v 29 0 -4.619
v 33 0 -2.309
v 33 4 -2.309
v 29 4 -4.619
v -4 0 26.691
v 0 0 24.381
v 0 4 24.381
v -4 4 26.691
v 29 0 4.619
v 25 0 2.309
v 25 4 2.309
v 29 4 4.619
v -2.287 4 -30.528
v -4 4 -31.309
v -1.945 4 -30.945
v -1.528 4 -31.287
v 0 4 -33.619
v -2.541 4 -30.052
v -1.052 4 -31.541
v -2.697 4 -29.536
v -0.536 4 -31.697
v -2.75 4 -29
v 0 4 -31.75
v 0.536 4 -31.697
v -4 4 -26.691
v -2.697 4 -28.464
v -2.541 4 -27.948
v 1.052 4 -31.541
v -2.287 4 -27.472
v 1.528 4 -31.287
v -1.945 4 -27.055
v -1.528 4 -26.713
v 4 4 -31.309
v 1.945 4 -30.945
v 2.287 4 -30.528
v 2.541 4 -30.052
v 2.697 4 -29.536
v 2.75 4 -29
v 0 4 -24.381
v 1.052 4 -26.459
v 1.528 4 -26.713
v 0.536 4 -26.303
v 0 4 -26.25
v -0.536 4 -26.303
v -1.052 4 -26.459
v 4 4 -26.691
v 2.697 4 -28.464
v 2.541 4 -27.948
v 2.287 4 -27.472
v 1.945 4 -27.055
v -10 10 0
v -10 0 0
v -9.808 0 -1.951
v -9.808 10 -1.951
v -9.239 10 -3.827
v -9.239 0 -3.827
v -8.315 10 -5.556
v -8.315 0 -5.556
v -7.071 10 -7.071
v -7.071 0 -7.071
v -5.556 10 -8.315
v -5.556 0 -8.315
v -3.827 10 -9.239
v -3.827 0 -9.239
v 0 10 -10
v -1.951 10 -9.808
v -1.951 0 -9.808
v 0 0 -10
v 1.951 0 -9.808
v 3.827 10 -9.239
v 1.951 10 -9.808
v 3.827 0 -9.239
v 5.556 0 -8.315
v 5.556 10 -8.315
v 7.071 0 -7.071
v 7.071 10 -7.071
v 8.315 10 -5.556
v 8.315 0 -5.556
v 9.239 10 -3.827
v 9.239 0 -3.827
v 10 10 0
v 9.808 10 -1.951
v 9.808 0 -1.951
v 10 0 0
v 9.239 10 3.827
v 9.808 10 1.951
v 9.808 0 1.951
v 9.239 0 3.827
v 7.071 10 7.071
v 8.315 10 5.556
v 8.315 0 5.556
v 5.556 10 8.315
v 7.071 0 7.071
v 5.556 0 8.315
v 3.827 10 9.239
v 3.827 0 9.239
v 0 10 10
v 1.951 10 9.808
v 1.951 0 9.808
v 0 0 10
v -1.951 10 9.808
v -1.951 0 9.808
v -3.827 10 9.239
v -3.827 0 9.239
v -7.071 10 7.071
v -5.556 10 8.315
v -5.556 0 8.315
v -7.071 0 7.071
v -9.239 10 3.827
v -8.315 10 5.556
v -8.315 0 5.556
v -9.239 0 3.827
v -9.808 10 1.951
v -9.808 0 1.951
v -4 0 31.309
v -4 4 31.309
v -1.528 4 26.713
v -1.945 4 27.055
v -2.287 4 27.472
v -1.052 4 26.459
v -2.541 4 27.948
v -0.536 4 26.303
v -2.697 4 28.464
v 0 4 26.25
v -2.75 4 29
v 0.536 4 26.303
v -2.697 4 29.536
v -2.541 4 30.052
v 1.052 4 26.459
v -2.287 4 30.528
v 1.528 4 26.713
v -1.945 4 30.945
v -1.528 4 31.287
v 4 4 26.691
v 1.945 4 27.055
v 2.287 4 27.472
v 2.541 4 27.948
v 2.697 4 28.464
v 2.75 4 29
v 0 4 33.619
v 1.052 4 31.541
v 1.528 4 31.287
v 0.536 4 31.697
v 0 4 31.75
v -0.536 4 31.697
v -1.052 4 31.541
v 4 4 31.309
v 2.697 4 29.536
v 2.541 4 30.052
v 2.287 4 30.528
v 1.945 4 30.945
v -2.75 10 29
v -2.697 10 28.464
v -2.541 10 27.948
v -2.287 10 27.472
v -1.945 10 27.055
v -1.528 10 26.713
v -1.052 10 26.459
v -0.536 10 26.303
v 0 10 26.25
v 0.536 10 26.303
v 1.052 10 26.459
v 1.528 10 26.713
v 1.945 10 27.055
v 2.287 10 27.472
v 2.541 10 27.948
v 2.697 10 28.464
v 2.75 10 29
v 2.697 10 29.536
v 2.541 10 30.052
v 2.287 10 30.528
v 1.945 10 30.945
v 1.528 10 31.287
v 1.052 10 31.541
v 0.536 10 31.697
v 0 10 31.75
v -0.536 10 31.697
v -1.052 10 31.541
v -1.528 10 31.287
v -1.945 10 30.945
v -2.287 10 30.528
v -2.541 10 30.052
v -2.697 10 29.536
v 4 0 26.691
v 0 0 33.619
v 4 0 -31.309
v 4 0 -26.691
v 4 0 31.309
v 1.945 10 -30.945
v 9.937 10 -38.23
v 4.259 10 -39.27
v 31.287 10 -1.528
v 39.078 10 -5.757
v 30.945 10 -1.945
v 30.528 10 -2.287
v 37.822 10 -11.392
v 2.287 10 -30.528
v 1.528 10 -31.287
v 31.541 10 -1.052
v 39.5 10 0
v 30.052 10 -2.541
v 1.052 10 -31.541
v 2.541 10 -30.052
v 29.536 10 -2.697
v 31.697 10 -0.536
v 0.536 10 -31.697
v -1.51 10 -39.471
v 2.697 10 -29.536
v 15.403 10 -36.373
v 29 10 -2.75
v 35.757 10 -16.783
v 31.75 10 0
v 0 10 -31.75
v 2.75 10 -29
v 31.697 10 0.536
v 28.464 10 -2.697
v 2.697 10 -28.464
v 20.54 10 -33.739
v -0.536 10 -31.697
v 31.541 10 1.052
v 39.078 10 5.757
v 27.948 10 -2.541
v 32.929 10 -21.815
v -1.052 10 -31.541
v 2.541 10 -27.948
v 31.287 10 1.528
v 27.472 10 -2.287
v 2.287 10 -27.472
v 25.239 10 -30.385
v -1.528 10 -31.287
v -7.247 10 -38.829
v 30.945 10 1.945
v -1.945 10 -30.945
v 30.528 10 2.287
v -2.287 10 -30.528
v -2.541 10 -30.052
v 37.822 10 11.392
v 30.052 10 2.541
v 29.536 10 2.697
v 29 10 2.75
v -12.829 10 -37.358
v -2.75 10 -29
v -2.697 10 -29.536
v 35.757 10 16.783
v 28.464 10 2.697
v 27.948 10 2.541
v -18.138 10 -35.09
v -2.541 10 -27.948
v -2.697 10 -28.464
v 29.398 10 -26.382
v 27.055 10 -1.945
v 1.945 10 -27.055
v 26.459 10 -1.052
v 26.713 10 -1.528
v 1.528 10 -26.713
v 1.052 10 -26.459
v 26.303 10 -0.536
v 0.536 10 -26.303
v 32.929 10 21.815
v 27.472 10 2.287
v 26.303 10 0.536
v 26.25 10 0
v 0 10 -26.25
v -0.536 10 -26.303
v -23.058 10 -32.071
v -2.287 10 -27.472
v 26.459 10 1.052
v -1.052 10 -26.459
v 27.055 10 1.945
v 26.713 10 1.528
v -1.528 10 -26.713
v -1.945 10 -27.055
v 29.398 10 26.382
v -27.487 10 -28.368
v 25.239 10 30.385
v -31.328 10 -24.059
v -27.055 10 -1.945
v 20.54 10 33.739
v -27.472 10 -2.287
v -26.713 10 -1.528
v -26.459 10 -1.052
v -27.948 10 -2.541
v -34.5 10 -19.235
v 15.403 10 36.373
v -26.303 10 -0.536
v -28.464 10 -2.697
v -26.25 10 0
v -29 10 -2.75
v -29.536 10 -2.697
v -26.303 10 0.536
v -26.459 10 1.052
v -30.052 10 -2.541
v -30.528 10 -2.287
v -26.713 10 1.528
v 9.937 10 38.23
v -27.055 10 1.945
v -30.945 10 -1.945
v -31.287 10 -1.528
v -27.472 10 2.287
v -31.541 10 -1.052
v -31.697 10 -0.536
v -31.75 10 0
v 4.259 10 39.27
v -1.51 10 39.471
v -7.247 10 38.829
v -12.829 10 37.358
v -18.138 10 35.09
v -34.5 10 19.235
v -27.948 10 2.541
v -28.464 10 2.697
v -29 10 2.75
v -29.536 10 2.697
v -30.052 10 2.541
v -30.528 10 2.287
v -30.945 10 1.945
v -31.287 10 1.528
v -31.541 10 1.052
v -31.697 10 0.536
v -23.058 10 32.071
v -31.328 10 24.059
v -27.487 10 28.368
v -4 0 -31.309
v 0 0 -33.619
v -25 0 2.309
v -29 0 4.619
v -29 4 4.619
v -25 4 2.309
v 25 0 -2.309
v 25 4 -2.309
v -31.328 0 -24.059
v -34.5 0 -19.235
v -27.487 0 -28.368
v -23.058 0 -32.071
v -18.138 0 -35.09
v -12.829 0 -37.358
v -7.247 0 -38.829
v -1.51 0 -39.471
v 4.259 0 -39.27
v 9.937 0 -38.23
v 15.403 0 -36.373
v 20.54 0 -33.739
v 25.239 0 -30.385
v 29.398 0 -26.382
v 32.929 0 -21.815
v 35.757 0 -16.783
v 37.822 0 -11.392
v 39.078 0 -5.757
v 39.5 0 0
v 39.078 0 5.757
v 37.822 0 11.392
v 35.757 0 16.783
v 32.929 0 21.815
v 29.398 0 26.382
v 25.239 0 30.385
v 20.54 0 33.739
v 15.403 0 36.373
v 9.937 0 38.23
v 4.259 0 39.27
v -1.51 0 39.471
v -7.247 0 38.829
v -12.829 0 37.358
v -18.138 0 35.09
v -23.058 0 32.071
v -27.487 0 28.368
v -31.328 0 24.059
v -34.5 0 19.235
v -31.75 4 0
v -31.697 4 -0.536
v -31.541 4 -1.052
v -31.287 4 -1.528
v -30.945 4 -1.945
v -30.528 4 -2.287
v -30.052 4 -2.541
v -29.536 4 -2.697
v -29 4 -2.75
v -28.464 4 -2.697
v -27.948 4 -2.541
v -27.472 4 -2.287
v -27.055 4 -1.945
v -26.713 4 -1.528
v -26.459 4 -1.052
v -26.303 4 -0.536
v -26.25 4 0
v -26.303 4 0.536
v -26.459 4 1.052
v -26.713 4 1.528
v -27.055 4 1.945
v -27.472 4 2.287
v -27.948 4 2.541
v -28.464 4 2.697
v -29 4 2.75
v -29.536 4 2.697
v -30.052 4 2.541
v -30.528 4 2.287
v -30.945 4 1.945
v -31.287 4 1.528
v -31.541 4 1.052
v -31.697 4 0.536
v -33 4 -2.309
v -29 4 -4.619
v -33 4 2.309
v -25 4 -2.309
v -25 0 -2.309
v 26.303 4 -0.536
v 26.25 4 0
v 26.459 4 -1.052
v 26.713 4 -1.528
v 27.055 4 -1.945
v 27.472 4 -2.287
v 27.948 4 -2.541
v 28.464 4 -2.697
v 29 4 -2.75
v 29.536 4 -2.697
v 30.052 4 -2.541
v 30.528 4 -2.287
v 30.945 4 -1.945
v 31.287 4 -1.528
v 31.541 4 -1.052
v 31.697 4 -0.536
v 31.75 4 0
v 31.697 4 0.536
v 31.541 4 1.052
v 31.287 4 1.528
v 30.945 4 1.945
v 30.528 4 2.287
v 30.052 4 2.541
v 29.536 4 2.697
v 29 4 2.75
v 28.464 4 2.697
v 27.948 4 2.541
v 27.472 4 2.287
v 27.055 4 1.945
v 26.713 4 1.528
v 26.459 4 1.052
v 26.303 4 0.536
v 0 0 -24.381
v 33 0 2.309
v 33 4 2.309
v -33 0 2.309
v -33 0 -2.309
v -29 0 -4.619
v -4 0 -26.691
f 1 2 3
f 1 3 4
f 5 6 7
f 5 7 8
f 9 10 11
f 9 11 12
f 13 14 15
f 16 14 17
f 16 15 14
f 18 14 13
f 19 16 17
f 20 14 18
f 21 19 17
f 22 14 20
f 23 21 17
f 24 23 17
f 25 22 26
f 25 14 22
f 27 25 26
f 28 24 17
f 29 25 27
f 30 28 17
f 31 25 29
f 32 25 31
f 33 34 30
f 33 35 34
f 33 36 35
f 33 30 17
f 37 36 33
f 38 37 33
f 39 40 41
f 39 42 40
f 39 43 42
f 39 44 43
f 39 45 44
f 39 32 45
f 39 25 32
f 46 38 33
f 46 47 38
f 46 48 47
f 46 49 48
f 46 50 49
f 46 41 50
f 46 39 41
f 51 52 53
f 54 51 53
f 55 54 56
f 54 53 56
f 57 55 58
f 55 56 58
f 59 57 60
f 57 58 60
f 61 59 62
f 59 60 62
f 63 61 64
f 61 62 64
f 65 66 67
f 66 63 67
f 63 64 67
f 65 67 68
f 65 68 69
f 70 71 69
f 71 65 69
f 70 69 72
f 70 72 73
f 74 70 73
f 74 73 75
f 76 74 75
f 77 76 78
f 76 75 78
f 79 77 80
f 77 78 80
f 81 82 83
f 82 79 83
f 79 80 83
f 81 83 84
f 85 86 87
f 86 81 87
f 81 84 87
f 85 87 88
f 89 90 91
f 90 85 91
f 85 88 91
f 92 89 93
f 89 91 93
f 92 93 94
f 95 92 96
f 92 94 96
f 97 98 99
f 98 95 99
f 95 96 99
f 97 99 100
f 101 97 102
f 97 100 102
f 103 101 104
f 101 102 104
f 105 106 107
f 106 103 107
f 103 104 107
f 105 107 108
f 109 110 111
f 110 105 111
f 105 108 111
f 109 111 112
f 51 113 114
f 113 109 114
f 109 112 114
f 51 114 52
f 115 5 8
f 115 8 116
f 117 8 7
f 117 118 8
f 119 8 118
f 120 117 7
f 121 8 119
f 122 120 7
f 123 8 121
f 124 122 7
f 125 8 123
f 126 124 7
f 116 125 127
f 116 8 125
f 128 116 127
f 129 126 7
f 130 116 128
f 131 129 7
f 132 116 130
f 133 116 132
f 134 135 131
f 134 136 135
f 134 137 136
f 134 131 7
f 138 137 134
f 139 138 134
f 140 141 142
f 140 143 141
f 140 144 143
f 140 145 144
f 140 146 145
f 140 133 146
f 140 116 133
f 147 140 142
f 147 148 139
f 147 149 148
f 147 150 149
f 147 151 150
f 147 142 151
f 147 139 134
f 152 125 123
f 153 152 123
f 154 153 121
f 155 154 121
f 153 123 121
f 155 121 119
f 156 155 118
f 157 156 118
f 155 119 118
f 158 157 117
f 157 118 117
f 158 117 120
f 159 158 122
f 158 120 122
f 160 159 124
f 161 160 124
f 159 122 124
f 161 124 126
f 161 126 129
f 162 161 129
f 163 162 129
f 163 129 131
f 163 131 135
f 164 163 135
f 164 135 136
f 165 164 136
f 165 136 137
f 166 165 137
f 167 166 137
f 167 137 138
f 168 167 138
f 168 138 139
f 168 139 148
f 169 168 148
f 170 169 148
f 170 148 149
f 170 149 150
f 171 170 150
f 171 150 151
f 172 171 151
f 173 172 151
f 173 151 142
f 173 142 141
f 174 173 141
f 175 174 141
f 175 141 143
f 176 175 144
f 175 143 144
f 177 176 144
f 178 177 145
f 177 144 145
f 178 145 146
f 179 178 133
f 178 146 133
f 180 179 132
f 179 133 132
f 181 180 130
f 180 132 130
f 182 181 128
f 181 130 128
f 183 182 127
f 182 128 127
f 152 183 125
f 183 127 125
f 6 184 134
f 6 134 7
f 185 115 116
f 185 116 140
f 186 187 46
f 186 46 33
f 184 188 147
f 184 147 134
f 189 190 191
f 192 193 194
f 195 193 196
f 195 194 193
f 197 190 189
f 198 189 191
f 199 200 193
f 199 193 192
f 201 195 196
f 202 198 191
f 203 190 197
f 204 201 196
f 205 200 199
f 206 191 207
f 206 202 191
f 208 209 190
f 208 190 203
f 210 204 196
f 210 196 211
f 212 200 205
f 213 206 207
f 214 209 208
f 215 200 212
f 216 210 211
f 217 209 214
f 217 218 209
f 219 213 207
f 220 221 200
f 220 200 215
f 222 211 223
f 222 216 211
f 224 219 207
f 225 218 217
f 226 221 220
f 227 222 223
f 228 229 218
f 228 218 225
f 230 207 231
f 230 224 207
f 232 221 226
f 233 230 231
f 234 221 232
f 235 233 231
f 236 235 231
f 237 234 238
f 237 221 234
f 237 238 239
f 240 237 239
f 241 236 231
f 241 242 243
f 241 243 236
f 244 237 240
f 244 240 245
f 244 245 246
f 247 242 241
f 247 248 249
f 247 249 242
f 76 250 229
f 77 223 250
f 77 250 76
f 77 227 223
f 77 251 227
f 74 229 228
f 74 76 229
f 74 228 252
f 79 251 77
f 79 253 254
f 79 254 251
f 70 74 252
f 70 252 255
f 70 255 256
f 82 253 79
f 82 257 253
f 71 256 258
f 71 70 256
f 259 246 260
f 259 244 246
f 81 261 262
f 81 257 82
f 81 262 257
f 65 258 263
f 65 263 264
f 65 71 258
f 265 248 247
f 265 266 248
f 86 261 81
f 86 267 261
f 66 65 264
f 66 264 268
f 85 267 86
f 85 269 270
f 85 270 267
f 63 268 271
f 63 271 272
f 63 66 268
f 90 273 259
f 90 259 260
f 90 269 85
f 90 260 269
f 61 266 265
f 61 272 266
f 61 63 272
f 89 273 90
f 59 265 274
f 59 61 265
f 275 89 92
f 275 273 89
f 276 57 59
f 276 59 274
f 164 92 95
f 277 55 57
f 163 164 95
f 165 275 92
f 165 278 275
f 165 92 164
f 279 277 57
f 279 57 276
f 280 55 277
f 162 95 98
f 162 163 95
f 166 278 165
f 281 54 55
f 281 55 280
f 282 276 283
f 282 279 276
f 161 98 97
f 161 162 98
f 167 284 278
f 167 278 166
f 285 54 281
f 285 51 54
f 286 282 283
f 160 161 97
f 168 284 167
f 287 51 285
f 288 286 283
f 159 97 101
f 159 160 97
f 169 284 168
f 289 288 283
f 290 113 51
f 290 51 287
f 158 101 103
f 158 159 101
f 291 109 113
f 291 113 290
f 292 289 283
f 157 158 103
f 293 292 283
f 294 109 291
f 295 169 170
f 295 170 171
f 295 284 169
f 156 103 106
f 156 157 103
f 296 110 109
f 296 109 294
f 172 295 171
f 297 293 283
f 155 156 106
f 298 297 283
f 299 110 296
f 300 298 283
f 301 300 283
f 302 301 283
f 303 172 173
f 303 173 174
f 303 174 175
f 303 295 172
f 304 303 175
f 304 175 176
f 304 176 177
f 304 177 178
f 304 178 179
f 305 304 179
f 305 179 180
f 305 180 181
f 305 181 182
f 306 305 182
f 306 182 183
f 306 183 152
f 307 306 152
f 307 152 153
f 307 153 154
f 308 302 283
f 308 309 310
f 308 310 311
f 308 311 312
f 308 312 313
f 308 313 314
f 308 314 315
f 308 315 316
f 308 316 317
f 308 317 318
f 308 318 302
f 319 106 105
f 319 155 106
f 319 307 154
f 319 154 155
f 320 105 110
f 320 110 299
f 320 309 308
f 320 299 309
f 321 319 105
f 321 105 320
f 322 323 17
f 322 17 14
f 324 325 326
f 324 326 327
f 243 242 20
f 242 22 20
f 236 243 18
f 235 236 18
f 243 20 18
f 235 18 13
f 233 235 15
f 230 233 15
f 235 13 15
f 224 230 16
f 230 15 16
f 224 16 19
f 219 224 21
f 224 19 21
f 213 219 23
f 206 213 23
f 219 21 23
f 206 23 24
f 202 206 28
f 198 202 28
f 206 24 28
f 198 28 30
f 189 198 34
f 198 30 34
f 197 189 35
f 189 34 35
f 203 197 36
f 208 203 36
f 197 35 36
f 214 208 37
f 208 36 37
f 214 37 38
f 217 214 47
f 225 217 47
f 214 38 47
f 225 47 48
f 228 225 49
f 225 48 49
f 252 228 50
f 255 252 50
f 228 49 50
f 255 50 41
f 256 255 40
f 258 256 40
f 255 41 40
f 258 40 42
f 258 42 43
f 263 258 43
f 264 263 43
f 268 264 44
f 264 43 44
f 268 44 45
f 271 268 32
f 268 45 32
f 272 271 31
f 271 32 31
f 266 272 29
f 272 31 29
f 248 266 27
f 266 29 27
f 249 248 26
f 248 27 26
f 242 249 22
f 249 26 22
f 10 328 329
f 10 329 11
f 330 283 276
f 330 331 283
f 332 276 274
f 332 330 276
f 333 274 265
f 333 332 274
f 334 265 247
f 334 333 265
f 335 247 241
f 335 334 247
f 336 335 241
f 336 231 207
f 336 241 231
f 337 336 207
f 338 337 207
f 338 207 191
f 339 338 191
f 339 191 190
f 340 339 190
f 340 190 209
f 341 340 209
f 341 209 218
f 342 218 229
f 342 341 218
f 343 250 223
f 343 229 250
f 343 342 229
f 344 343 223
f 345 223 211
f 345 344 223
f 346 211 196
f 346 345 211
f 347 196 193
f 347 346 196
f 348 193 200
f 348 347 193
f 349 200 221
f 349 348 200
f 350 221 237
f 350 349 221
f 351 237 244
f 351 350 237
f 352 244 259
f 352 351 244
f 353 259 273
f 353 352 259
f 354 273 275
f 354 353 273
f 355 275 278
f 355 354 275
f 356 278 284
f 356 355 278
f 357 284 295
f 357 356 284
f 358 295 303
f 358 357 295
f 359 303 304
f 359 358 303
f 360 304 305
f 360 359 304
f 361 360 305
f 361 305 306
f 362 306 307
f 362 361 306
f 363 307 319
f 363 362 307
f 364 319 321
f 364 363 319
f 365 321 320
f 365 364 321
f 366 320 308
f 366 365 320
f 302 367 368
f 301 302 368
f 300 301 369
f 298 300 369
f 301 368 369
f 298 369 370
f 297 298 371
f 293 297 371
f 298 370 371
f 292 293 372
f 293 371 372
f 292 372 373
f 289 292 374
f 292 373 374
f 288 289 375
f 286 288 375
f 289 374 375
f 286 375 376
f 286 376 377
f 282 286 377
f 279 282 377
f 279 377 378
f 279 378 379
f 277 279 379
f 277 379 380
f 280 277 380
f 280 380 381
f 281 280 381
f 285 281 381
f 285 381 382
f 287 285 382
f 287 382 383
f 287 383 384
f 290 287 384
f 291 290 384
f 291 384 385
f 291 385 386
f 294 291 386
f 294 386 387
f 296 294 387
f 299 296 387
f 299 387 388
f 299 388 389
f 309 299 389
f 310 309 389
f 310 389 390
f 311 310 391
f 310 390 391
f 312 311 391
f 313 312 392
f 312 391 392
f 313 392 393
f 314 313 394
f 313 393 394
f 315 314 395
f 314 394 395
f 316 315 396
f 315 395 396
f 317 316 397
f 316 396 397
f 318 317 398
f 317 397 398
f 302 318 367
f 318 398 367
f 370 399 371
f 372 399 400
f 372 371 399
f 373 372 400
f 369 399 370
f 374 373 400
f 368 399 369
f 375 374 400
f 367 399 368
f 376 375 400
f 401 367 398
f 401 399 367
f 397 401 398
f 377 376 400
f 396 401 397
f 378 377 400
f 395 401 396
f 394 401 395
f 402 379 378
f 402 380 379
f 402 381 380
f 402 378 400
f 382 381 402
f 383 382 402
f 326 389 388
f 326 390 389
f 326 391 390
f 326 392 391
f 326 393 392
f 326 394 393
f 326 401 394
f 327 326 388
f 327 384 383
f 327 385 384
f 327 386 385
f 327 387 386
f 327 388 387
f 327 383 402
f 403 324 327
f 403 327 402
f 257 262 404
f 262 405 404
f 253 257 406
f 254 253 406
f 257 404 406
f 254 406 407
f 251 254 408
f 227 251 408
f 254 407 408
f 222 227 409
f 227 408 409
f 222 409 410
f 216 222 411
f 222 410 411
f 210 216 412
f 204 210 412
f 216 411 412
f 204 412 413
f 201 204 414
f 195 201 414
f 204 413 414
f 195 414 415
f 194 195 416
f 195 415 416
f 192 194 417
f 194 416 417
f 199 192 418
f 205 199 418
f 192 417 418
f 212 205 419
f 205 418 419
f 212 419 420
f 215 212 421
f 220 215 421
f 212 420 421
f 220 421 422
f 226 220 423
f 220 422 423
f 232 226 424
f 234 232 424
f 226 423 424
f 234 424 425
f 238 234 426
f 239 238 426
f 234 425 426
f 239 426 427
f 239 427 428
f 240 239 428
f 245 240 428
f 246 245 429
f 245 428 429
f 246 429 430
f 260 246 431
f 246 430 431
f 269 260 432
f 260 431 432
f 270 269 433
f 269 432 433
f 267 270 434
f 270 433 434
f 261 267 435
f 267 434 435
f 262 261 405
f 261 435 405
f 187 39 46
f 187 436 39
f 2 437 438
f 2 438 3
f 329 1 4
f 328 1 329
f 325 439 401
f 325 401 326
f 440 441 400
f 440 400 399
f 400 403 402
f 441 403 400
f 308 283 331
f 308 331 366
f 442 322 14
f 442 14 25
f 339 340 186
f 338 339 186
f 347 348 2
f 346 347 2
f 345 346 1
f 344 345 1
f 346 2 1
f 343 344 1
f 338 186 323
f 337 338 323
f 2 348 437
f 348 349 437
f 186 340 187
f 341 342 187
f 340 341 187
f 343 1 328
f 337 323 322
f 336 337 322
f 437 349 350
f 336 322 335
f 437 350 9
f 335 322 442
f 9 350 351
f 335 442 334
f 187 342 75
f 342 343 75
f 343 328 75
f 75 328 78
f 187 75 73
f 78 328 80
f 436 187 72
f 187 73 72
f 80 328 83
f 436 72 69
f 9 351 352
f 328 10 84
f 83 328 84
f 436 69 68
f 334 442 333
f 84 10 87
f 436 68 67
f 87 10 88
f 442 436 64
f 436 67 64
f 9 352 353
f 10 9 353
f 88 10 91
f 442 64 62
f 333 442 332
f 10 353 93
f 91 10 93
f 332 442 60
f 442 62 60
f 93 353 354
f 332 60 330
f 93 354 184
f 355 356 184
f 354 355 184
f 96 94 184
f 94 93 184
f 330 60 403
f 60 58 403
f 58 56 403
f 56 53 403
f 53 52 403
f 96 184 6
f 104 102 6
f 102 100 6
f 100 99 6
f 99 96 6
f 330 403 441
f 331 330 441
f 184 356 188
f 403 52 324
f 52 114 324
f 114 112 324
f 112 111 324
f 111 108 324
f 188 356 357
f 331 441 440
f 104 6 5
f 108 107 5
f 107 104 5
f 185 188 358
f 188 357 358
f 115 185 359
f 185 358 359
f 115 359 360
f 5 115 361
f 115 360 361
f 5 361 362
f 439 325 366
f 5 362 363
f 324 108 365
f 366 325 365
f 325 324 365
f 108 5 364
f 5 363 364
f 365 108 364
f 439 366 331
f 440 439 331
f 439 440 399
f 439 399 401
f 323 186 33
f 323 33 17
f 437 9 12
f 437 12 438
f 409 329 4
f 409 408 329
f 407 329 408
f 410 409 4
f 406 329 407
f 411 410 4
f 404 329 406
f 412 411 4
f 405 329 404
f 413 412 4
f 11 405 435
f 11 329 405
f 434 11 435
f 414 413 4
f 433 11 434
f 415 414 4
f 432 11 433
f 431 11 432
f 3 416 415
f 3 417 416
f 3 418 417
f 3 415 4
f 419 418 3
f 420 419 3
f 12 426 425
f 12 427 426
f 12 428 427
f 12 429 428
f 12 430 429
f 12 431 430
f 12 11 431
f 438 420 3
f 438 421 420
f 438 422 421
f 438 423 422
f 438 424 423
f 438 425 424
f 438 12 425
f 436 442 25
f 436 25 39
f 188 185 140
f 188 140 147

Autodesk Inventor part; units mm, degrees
ref_plane "YZ Plane" through (0, 0, 0) normal (1, 0, 0) x (0, 1, 0)
ref_plane "XZ Plane" through (0, 0, 0) normal (0, 1, 0) x (-1, 0, 0)
ref_plane "XY Plane" through (0, 0, 0) normal (0, 0, 1) x (1, 0, 0)
sketch "Sketch1" plane through (0, 0, 0) normal (0, 1, 0) x (-1, 0, 0)
  circle A0 centre (0, 0) radius 39.5
  circle A1 centre (0, 0) radius 10
  circle A2 centre (0, 0) radius 29
  circle A3 centre (29, 0) radius 2.75
  circle A4 centre (0, 29) radius 2.75
  circle A5 centre (-29, 0) radius 2.75
  circle A6 centre (0, -29) radius 2.75
  dimension "d2" = 58
  dimension "d0" = 79
  dimension "d1" = 20
  dimension "d3" = 5.5
  dimension "d6" = 360
extrude "Extrusion1" add sketch "Sketch1" along normal blind 10 contours A0 | A3 A2 A6 A5 A4
sketch "Sketch2" plane through (0, 0, 0) normal (0, -1, 0) x (1, 0, 0)
  circle A0 centre (0, -29) radius 2.75 projected
  circle A1 centre (0, 0) radius 29
  circle A2 centre (29, 0) radius 2.75 projected
  circle A3 centre (29, 0) radius 4
  circle A4 centre (0, 29) radius 4
  circle A5 centre (-29, 0) radius 4
  circle A6 centre (0, -29) radius 4
  line L0 (25, 2.3094) -> (29, 4.6188)
  line L1 (29, 4.6188) -> (33, 2.3094)
  line L2 (33, 2.3094) -> (33, -2.3094)
  line L3 (33, -2.3094) -> (29, -4.6188)
  line L4 (29, -4.6188) -> (25, -2.3094)
  line L5 (25, -2.3094) -> (25, 2.3094)
  line L6 (-4, -26.6906) -> (0, -24.3812)
  line L7 (0, -24.3812) -> (4, -26.6906)
  line L8 (4, -26.6906) -> (4, -31.3094)
  line L9 (4, -31.3094) -> (0, -33.6188)
  line L10 (0, -33.6188) -> (-4, -31.3094)
  line L11 (-4, -31.3094) -> (-4, -26.6906)
  line L12 (-33, 2.3094) -> (-29, 4.6188)
  line L13 (-29, 4.6188) -> (-25, 2.3094)
  line L14 (-25, 2.3094) -> (-25, -2.3094)
  line L15 (-25, -2.3094) -> (-29, -4.6188)
  line L16 (-29, -4.6188) -> (-33, -2.3094)
  line L17 (-33, -2.3094) -> (-33, 2.3094)
  line L18 (-4, 31.3094) -> (0, 33.6188)
  line L19 (0, 33.6188) -> (4, 31.3094)
  line L20 (4, 31.3094) -> (4, 26.6906)
  line L21 (4, 26.6906) -> (0, 24.3812)
  line L22 (0, 24.3812) -> (-4, 26.6906)
  line L23 (-4, 26.6906) -> (-4, 31.3094)
  circle A7 centre (0, 29) radius 2.75
  circle A8 centre (-29, 0) radius 2.75
  point P0 (25, 0)
  point P1 (-4, -29)
  point P2 (-33, 0)
  point P3 (-4, 29)
  dimension "d10" = 8
  dimension "d13" = 360
extrude "Extrusion2" cut sketch "Sketch2" against normal blind 4 contours A0 A1 A6 | A0 A1 A6 | A6 L7 L8 A1 | A1 L8 A6 | A6 L11 A1 | A1 L11 L6 A6 | L8 L9 A6 | A6 L6 L7 | A6 L10 L11 | L4 A3 A1 | A1 A3 L3 L4 | L9 L10 A6 | L15 L16 A5 A1 | A1 A5 L15 | A3 A1 A2 | A1 A2 A3 | L4 L5 A3 | A5 A1 A8 | A1 A8 A5 | A5 L14 L15 | A3 L2 L3 | L5 L0 A3 | L16 L17 A5 | A5 L13 L14 | A3 L1 L2 | L0 A1 A3 | L17 L12 A5 | A5 A1 L13 | A1 L0 L1 A3 | A5 L12 L13 A1 | L20 L21 A4 A1 | A1 A4 L20 | L23 A4 A1 | A1 A4 L22 L23 | A4 A1 A7 | A1 A7 A4 | A4 L19 L20 | L23 L18 A4 | L21 L22 A4 | A4 L18 L19
sketch "Sketch3" plane through (0, 10, 0) normal (0, 1, 0) x (1, 0, 0)
  line L0 (-34.5, 50.157) -> (-34.5, -49.8555)
  circle A0 centre (0, 0) radius 39.5 projected
  point P0 (-34.5, -19.2354)
  point P1 (-34.5, 19.2354)
  dimension "d18" = 5
extrude "Extrusion3" cut sketch "Sketch3" along normal through all both and the other way through all contours L0 A0 picked at (-35.5583, 3.956)
properties part number "Adapter Plate"
